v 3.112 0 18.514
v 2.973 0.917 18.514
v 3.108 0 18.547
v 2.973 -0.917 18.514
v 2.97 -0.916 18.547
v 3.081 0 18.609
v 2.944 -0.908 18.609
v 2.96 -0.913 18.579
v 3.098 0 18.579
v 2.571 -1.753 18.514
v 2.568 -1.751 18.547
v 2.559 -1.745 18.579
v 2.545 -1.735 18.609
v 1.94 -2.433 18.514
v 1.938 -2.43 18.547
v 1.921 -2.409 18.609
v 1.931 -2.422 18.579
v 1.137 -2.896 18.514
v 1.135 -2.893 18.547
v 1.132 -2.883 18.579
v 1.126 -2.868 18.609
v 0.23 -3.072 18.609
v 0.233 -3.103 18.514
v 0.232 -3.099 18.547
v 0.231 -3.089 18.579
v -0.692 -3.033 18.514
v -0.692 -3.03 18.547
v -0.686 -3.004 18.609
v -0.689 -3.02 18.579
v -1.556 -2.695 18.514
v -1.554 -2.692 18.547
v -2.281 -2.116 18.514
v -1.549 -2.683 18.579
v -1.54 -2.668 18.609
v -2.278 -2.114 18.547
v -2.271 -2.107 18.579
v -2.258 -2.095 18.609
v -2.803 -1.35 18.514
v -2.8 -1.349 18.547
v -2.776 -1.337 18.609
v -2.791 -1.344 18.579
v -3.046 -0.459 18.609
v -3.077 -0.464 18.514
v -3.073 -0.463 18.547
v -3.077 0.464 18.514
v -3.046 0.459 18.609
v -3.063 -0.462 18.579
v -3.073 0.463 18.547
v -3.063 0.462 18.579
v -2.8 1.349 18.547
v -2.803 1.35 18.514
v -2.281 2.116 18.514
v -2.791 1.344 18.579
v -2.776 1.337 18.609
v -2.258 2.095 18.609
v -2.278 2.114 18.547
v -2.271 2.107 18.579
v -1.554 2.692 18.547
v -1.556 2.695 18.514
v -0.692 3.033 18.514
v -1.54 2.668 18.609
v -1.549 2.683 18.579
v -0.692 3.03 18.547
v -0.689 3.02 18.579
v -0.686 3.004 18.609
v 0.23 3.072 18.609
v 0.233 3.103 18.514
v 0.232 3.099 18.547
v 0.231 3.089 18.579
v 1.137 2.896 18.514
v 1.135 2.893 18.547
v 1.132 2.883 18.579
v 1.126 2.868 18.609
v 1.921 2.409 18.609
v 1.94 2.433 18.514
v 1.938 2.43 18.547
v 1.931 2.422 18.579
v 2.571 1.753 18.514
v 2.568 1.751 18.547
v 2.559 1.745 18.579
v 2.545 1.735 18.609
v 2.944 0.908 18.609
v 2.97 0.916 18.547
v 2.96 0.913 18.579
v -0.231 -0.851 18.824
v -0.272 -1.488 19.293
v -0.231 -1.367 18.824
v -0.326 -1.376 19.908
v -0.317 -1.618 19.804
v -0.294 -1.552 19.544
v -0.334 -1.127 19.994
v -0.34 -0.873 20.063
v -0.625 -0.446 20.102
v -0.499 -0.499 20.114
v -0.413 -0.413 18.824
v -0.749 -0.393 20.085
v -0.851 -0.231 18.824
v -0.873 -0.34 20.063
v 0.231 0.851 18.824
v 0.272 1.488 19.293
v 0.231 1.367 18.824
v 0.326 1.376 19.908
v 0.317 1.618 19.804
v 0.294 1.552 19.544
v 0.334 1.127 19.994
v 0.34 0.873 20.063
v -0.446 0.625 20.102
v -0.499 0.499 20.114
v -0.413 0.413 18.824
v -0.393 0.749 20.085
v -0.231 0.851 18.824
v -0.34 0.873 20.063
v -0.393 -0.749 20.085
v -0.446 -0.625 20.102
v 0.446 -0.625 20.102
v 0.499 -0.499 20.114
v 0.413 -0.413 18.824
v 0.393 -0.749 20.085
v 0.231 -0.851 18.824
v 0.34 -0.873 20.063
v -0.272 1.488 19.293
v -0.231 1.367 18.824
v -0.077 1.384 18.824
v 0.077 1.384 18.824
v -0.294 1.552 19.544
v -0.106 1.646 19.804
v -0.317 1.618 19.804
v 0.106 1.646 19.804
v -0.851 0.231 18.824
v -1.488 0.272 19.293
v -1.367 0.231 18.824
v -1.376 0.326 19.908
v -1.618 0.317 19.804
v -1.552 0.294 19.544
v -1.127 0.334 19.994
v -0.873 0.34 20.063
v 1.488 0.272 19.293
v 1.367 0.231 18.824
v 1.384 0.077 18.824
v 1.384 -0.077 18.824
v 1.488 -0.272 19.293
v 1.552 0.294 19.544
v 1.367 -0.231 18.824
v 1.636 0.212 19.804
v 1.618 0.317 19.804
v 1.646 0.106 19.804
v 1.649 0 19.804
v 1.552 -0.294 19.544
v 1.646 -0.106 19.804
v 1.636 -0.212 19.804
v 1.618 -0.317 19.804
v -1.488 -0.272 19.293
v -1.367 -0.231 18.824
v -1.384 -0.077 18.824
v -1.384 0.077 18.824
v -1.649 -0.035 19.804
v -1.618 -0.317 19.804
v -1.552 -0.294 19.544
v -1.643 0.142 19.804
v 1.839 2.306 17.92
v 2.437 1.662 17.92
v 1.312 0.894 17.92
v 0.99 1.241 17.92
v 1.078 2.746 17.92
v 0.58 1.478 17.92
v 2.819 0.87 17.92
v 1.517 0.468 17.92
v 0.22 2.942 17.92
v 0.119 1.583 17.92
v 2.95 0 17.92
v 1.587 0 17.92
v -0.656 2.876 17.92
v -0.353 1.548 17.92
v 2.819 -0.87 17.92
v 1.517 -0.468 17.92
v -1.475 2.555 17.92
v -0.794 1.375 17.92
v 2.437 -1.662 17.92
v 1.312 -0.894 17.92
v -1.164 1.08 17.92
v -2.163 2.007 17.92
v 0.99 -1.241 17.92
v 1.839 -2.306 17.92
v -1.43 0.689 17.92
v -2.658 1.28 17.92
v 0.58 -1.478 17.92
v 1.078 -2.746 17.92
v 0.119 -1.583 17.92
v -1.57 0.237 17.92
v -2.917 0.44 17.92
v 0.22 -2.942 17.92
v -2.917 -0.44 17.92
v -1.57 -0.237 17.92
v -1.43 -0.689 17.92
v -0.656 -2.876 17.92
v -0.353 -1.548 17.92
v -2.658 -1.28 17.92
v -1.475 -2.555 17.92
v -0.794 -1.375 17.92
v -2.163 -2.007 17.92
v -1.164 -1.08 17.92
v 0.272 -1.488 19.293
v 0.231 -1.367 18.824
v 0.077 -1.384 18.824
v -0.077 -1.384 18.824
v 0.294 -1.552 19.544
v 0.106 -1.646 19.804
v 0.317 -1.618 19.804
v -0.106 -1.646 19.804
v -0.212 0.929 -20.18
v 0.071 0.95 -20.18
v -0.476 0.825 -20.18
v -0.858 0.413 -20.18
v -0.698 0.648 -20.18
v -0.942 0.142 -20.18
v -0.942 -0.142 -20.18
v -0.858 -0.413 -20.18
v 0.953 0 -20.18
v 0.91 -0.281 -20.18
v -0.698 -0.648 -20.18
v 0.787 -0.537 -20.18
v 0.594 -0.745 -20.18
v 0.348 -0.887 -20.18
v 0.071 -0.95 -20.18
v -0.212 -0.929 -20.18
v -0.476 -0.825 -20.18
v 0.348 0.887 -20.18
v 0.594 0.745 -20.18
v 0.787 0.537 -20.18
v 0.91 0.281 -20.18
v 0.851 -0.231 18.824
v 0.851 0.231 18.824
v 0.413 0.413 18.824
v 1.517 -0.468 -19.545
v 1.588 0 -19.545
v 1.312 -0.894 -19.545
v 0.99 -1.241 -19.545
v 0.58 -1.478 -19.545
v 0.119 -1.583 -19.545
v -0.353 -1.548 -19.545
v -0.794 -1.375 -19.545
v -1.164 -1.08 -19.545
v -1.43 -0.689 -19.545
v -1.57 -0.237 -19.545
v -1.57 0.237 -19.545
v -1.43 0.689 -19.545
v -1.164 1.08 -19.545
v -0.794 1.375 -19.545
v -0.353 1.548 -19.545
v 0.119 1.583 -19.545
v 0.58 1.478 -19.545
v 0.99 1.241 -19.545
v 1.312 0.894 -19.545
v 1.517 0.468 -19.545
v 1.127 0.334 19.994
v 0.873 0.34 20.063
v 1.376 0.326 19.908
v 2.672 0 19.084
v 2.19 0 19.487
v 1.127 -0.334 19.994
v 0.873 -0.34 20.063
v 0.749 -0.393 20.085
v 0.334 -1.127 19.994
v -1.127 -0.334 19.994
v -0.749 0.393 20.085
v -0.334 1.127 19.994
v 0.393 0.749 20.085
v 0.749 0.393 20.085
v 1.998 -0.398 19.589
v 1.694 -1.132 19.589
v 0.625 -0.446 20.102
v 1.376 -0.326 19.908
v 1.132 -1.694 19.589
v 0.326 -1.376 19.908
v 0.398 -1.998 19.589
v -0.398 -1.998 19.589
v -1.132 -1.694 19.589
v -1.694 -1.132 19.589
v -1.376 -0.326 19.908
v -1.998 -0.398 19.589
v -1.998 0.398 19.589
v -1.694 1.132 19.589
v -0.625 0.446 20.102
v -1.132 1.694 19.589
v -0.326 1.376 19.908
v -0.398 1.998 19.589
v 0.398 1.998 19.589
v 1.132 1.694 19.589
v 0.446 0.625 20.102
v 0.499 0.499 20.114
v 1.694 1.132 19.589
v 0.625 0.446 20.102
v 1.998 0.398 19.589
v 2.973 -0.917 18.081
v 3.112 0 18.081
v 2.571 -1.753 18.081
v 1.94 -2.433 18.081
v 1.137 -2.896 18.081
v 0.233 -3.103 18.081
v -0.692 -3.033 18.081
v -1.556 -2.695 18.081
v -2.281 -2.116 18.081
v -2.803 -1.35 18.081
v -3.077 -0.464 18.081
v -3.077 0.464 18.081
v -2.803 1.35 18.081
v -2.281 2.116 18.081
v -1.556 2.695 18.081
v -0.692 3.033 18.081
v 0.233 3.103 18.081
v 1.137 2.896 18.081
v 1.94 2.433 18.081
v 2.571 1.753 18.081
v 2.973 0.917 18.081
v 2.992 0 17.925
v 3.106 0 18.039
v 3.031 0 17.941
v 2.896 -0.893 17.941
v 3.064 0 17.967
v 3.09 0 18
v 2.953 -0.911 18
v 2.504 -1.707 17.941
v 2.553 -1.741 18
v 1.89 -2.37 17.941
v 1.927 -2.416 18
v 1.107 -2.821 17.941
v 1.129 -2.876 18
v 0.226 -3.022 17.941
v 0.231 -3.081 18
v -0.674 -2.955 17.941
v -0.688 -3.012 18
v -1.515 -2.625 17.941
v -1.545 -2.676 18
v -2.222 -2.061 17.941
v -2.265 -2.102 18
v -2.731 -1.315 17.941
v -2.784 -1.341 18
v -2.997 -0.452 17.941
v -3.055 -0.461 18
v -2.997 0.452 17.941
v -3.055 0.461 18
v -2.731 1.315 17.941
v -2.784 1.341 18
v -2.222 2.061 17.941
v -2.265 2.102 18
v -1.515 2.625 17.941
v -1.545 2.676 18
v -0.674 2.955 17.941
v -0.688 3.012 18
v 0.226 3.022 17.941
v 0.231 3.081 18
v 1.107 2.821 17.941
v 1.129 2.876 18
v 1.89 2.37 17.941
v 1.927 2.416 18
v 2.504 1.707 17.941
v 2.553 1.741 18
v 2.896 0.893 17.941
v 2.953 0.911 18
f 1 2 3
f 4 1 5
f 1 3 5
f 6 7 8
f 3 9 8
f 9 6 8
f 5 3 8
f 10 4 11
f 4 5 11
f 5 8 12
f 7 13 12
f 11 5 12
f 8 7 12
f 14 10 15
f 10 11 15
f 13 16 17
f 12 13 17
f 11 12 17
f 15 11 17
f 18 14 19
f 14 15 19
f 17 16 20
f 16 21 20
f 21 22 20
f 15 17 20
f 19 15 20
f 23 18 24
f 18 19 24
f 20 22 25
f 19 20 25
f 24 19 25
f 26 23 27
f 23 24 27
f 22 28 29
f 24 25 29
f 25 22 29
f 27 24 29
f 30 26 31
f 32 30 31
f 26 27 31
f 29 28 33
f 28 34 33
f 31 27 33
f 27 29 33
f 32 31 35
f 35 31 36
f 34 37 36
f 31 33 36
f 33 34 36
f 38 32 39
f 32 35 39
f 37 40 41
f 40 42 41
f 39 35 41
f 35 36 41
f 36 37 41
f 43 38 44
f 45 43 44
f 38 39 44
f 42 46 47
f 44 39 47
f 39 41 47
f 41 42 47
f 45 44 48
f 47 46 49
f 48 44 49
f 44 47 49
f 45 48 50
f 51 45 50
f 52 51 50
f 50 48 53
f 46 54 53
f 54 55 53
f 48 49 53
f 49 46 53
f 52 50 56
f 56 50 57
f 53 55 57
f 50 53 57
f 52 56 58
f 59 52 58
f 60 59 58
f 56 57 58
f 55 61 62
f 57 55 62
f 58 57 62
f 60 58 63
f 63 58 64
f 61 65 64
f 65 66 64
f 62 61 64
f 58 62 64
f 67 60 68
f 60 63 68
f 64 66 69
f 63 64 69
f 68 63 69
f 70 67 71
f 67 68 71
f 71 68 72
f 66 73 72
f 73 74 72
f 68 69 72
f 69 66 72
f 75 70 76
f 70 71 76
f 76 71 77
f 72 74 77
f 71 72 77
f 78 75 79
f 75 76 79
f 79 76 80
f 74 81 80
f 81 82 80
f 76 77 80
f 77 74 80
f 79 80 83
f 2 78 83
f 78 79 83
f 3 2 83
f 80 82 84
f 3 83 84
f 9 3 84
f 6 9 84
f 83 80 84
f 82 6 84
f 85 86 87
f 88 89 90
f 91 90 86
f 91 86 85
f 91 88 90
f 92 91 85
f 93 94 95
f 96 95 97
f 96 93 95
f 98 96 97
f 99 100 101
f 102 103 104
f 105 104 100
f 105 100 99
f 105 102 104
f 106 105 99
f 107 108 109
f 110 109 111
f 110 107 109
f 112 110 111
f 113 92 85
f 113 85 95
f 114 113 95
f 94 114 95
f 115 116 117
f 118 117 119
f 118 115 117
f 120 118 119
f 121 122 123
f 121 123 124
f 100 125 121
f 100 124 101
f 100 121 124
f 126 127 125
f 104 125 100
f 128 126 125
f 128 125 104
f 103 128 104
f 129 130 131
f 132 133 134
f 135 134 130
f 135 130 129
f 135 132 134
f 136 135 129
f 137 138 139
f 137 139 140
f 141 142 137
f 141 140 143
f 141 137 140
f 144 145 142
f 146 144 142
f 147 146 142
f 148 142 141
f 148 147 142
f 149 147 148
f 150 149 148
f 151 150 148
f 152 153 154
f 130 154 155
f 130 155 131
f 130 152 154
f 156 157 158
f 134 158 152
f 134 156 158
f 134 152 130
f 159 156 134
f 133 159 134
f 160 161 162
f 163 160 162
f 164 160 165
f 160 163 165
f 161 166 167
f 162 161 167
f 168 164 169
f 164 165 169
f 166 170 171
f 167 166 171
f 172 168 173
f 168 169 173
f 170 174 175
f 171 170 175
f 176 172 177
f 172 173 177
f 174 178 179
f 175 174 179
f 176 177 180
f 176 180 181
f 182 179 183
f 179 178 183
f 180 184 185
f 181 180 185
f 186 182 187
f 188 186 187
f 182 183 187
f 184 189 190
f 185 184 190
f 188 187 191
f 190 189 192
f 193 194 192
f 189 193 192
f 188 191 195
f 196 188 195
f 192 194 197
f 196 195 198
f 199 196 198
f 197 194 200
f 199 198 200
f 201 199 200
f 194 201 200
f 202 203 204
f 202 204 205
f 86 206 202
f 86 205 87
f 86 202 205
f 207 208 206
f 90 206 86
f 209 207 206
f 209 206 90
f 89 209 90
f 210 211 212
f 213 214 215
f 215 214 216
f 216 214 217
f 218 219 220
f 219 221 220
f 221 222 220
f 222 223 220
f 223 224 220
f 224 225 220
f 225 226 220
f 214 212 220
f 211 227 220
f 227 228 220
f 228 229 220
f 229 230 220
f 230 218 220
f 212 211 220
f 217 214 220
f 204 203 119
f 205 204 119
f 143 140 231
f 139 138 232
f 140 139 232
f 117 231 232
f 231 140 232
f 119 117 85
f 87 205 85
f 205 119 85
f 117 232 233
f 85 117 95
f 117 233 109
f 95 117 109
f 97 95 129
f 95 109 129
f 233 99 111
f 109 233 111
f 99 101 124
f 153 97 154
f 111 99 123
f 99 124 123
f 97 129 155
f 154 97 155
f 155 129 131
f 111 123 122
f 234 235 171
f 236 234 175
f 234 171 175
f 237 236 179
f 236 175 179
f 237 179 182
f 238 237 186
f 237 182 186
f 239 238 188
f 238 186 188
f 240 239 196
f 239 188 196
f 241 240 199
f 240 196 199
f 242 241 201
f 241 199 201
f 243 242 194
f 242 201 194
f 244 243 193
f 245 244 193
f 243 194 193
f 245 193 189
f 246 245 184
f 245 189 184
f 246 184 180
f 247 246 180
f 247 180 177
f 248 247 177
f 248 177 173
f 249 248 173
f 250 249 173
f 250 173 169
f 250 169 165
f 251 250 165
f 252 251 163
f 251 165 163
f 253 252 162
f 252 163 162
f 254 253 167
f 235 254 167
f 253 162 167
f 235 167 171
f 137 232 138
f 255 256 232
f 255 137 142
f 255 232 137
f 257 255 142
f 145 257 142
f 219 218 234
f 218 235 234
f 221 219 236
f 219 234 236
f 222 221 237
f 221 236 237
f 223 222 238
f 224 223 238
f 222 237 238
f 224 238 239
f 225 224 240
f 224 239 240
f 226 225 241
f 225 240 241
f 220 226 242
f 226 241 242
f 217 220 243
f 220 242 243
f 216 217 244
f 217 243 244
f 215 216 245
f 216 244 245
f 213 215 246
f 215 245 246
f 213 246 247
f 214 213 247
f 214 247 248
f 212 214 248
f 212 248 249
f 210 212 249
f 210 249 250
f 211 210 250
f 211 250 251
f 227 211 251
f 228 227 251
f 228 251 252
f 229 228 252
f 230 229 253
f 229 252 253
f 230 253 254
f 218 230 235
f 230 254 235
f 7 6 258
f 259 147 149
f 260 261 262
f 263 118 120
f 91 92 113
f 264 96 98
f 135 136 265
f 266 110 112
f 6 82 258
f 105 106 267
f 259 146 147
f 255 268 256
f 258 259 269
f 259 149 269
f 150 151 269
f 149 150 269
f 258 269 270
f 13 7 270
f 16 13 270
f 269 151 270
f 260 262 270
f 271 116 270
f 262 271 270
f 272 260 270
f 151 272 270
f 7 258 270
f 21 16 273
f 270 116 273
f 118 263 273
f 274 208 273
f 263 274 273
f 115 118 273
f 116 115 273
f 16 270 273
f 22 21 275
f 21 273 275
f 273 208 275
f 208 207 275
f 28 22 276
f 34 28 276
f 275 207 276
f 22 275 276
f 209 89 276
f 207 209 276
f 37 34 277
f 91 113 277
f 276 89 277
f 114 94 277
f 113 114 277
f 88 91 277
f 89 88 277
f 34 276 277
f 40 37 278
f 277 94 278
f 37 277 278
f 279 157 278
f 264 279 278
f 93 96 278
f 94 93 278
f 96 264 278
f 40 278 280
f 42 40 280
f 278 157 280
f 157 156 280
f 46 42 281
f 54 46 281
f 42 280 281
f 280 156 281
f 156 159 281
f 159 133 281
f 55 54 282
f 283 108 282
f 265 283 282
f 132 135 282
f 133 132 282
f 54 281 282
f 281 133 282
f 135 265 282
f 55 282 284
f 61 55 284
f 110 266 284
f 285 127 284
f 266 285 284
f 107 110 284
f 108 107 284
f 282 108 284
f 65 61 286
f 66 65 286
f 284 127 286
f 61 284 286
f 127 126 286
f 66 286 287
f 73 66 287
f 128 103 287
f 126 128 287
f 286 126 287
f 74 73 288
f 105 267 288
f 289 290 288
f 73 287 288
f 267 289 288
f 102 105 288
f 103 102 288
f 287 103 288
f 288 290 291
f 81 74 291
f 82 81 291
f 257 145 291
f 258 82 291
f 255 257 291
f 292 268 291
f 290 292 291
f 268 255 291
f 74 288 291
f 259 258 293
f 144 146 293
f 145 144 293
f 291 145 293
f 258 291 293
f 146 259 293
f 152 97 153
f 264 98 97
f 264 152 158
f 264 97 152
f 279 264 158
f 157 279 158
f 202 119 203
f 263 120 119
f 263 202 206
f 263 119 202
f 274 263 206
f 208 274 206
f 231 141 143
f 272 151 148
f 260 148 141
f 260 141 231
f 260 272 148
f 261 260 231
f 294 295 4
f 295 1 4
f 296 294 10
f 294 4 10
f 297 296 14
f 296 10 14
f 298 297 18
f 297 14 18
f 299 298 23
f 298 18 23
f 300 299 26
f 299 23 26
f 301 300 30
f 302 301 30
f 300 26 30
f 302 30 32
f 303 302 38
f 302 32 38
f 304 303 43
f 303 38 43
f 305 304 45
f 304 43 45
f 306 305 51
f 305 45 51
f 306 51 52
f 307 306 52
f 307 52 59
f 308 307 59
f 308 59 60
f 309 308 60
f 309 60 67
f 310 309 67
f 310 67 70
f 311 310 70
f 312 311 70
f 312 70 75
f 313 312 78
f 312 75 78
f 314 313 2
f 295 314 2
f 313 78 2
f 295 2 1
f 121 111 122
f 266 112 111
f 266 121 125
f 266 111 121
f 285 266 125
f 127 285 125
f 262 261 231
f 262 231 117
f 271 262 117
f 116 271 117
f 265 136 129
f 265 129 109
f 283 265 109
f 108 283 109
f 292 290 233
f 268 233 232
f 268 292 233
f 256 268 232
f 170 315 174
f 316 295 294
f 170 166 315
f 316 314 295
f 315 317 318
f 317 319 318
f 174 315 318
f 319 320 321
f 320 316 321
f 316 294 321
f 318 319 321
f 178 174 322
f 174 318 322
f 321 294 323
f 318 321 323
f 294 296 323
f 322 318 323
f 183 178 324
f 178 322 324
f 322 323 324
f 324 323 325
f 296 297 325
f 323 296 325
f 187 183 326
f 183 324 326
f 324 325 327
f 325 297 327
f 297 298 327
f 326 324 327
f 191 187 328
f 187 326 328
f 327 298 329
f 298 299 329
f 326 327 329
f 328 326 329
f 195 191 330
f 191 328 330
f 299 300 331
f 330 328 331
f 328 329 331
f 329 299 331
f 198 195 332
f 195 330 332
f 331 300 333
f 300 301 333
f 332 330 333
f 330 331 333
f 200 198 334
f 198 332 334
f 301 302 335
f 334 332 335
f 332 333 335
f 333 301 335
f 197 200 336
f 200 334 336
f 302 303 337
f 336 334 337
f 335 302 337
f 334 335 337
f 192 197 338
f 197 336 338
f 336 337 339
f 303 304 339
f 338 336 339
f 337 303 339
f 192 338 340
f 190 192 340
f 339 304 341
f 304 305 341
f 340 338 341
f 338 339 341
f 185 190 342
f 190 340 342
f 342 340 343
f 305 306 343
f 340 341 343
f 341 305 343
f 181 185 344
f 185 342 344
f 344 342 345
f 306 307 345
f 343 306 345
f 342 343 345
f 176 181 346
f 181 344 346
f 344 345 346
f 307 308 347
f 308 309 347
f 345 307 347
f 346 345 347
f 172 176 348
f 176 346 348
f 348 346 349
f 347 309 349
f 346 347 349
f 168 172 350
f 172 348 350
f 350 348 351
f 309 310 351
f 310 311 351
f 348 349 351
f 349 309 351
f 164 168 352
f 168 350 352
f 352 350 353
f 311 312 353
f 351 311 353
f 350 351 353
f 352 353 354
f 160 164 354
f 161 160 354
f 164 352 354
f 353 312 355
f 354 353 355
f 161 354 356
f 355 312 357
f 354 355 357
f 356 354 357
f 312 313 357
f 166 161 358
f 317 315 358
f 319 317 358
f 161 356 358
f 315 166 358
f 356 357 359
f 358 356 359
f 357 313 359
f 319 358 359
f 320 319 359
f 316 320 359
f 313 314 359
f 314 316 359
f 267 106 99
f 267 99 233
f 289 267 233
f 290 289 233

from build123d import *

# Parameters (mm, degrees)
CUT_EXTRUDE1_DEPTH = 1.3563599999999998
DRAFT1_ANGLE       = 15.000000000000034
DRAFT2_ANGLE       = 5.000000000000011


with BuildPart() as part:
    # Sketch2 → Revolve1 (revolve)
    with BuildSketch(Plane(origin=(0, 0, 0), x_dir=(0, 0, -1), z_dir=(1, 0, 0))):
        with BuildLine():
            Line((20.1803, -1.04e-15), (20.1803, 0.9525000000000102))
            Line((20.1803, 0.9525000000000102), (19.5453, 1.5875000000000012))
            Line((19.5453, 1.5875000000000012), (-17.919699999999995, 1.5874999999999961))
            Line((-17.919699999999995, 1.5874999999999961), (-17.919699999999995, 2.9500285714285748))
            ThreePointArc((-17.919699999999995, 2.9500285714285748), (-17.96699388646069, 3.064206113539311), (-18.081171428571423, 3.1115000000000004))
            Line((-18.081171428571423, 3.1115000000000004), (-18.513836667869654, 3.1115000000000004))
            ThreePointArc((-18.513836667869654, 3.1115000000000004), (-18.56365651443409, 3.103622207798032), (-18.60861518645835, 3.0807575072424545))
            ThreePointArc((-18.60861518645835, 3.0807575072424545), (-19.76468125738231, 1.7292527267253457), (-20.1803, -1.04e-15))
            Line((-20.1803, -1.04e-15), (20.1803, -1.04e-15))
        make_face()
    revolve(axis=Axis((0, -1.04e-15, 20.1803), (0, 0, -1)))

    # Sketch3 → Cut-Extrude1 (cut)
    with BuildSketch(Plane.XY.offset(20.1803)):
        with BuildLine():
            Line((0.34999999999999976, 0.8750000000000079), (0.503768939877063, 0.5037689398770607))
            Line((0.503768939877063, 0.5037689398770607), (0.8750000000000099, 0.34999999999999704))
            Line((0.8750000000000099, 0.34999999999999704), (1.7146428199482453, 0.34999999999999704))
            ThreePointArc((1.7146428199482453, 0.34999999999999704), (1.7500000000000198, 3e-17), (1.7146428199482453, -0.34999999999999704))
            Line((1.7146428199482453, -0.34999999999999704), (0.8750000000000099, -0.34999999999999704))
            Line((0.8750000000000099, -0.34999999999999704), (0.503768939877063, -0.5037689398770607))
            Line((0.503768939877063, -0.5037689398770607), (0.34999999999999976, -0.8750000000000079))
            Line((0.34999999999999976, -0.8750000000000079), (0.3499999999999997, -1.7146428199482433))
            ThreePointArc((0.3499999999999997, -1.7146428199482433), (1.1e-16, -1.7500000000000182), (-0.3499999999999997, -1.7146428199482433))
            Line((-0.3499999999999997, -1.7146428199482433), (-0.34999999999999976, -0.8750000000000079))
            Line((-0.34999999999999976, -0.8750000000000079), (-0.503768939877063, -0.5037689398770607))
            Line((-0.503768939877063, -0.5037689398770607), (-0.8750000000000099, -0.34999999999999704))
            Line((-0.8750000000000099, -0.34999999999999704), (-1.7146428199482453, -0.34999999999999704))
            ThreePointArc((-1.7146428199482453, -0.34999999999999704), (-1.7500000000000198, 7.7e-16), (-1.7146428199482453, 0.34999999999999704))
            Line((-1.7146428199482453, 0.34999999999999704), (-0.8750000000000099, 0.34999999999999704))
            Line((-0.8750000000000099, 0.34999999999999704), (-0.503768939877063, 0.5037689398770607))
            Line((-0.503768939877063, 0.5037689398770607), (-0.34999999999999976, 0.8750000000000079))
            Line((-0.34999999999999976, 0.8750000000000079), (-0.3499999999999997, 1.7146428199482433))
            ThreePointArc((-0.3499999999999997, 1.7146428199482433), (1.1e-16, 1.7500000000000182), (0.3499999999999997, 1.7146428199482433))
            Line((0.3499999999999997, 1.7146428199482433), (0.34999999999999976, 0.8750000000000079))
        make_face()
    extrude(amount=-CUT_EXTRUDE1_DEPTH, mode=Mode.SUBTRACT)

    # Draft1
    draft1_faces = [part.faces().sort_by_distance(p)[0] for p in [
        (1.75000000000002, -1.2e-16, 19.288978259234977),
        (1.1e-16, 1.7500000000000182, 19.288978259234973),
        (-1.1e-16, -1.7500000000000182, 19.288978259234973),
        (-1.75000000000002, 1.2e-16, 19.288978259234977),
    ]]
    draft(draft1_faces, Plane.XY.offset(20.1803), DRAFT1_ANGLE)

    # Draft2
    draft2_faces = [part.faces().sort_by_distance(p)[0] for p in [
        (0.34999999999999976, 1.1737349239582924, 19.433218643964523),
        (1.1737349239582944, -0.34999999999999704, 19.433218643964523),
        (0.34999999999999976, -1.1737349239582895, 19.43321864396451),
        (-0.34999999999999976, -1.1737349239582928, 19.433218643964523),
        (-1.1737349235946184, -0.34999999999999704, 19.43321864202573),
        (-1.1737349239582946, 0.34999999999999704, 19.433218643964523),
        (-0.34999999999999976, 1.173734923958288, 19.4332186439645),
        (1.1737349239582153, 0.34999999999999704, 19.433218643964103),
        (0.6881338316552983, 0.4274025012770691, 19.457589851504),
        (0.4274025012770716, 0.6881338316552962, 19.457589851504004),
        (0.6881338316552983, -0.4274025012770691, 19.457589851504004),
        (0.4274025012770716, -0.6881338316552962, 19.457589851504),
        (-0.4274025012770716, -0.6881338316552962, 19.457589851504007),
        (-0.6881338316552983, -0.4274025012770691, 19.457589851504),
        (-0.6881338316552983, 0.4274025012770691, 19.457589851504004),
        (-0.4274025012770716, 0.6881338316552963, 19.457589851504),
    ]]
    draft(draft2_faces, Plane.XY.offset(20.1803), DRAFT2_ANGLE)


solid = part.part
